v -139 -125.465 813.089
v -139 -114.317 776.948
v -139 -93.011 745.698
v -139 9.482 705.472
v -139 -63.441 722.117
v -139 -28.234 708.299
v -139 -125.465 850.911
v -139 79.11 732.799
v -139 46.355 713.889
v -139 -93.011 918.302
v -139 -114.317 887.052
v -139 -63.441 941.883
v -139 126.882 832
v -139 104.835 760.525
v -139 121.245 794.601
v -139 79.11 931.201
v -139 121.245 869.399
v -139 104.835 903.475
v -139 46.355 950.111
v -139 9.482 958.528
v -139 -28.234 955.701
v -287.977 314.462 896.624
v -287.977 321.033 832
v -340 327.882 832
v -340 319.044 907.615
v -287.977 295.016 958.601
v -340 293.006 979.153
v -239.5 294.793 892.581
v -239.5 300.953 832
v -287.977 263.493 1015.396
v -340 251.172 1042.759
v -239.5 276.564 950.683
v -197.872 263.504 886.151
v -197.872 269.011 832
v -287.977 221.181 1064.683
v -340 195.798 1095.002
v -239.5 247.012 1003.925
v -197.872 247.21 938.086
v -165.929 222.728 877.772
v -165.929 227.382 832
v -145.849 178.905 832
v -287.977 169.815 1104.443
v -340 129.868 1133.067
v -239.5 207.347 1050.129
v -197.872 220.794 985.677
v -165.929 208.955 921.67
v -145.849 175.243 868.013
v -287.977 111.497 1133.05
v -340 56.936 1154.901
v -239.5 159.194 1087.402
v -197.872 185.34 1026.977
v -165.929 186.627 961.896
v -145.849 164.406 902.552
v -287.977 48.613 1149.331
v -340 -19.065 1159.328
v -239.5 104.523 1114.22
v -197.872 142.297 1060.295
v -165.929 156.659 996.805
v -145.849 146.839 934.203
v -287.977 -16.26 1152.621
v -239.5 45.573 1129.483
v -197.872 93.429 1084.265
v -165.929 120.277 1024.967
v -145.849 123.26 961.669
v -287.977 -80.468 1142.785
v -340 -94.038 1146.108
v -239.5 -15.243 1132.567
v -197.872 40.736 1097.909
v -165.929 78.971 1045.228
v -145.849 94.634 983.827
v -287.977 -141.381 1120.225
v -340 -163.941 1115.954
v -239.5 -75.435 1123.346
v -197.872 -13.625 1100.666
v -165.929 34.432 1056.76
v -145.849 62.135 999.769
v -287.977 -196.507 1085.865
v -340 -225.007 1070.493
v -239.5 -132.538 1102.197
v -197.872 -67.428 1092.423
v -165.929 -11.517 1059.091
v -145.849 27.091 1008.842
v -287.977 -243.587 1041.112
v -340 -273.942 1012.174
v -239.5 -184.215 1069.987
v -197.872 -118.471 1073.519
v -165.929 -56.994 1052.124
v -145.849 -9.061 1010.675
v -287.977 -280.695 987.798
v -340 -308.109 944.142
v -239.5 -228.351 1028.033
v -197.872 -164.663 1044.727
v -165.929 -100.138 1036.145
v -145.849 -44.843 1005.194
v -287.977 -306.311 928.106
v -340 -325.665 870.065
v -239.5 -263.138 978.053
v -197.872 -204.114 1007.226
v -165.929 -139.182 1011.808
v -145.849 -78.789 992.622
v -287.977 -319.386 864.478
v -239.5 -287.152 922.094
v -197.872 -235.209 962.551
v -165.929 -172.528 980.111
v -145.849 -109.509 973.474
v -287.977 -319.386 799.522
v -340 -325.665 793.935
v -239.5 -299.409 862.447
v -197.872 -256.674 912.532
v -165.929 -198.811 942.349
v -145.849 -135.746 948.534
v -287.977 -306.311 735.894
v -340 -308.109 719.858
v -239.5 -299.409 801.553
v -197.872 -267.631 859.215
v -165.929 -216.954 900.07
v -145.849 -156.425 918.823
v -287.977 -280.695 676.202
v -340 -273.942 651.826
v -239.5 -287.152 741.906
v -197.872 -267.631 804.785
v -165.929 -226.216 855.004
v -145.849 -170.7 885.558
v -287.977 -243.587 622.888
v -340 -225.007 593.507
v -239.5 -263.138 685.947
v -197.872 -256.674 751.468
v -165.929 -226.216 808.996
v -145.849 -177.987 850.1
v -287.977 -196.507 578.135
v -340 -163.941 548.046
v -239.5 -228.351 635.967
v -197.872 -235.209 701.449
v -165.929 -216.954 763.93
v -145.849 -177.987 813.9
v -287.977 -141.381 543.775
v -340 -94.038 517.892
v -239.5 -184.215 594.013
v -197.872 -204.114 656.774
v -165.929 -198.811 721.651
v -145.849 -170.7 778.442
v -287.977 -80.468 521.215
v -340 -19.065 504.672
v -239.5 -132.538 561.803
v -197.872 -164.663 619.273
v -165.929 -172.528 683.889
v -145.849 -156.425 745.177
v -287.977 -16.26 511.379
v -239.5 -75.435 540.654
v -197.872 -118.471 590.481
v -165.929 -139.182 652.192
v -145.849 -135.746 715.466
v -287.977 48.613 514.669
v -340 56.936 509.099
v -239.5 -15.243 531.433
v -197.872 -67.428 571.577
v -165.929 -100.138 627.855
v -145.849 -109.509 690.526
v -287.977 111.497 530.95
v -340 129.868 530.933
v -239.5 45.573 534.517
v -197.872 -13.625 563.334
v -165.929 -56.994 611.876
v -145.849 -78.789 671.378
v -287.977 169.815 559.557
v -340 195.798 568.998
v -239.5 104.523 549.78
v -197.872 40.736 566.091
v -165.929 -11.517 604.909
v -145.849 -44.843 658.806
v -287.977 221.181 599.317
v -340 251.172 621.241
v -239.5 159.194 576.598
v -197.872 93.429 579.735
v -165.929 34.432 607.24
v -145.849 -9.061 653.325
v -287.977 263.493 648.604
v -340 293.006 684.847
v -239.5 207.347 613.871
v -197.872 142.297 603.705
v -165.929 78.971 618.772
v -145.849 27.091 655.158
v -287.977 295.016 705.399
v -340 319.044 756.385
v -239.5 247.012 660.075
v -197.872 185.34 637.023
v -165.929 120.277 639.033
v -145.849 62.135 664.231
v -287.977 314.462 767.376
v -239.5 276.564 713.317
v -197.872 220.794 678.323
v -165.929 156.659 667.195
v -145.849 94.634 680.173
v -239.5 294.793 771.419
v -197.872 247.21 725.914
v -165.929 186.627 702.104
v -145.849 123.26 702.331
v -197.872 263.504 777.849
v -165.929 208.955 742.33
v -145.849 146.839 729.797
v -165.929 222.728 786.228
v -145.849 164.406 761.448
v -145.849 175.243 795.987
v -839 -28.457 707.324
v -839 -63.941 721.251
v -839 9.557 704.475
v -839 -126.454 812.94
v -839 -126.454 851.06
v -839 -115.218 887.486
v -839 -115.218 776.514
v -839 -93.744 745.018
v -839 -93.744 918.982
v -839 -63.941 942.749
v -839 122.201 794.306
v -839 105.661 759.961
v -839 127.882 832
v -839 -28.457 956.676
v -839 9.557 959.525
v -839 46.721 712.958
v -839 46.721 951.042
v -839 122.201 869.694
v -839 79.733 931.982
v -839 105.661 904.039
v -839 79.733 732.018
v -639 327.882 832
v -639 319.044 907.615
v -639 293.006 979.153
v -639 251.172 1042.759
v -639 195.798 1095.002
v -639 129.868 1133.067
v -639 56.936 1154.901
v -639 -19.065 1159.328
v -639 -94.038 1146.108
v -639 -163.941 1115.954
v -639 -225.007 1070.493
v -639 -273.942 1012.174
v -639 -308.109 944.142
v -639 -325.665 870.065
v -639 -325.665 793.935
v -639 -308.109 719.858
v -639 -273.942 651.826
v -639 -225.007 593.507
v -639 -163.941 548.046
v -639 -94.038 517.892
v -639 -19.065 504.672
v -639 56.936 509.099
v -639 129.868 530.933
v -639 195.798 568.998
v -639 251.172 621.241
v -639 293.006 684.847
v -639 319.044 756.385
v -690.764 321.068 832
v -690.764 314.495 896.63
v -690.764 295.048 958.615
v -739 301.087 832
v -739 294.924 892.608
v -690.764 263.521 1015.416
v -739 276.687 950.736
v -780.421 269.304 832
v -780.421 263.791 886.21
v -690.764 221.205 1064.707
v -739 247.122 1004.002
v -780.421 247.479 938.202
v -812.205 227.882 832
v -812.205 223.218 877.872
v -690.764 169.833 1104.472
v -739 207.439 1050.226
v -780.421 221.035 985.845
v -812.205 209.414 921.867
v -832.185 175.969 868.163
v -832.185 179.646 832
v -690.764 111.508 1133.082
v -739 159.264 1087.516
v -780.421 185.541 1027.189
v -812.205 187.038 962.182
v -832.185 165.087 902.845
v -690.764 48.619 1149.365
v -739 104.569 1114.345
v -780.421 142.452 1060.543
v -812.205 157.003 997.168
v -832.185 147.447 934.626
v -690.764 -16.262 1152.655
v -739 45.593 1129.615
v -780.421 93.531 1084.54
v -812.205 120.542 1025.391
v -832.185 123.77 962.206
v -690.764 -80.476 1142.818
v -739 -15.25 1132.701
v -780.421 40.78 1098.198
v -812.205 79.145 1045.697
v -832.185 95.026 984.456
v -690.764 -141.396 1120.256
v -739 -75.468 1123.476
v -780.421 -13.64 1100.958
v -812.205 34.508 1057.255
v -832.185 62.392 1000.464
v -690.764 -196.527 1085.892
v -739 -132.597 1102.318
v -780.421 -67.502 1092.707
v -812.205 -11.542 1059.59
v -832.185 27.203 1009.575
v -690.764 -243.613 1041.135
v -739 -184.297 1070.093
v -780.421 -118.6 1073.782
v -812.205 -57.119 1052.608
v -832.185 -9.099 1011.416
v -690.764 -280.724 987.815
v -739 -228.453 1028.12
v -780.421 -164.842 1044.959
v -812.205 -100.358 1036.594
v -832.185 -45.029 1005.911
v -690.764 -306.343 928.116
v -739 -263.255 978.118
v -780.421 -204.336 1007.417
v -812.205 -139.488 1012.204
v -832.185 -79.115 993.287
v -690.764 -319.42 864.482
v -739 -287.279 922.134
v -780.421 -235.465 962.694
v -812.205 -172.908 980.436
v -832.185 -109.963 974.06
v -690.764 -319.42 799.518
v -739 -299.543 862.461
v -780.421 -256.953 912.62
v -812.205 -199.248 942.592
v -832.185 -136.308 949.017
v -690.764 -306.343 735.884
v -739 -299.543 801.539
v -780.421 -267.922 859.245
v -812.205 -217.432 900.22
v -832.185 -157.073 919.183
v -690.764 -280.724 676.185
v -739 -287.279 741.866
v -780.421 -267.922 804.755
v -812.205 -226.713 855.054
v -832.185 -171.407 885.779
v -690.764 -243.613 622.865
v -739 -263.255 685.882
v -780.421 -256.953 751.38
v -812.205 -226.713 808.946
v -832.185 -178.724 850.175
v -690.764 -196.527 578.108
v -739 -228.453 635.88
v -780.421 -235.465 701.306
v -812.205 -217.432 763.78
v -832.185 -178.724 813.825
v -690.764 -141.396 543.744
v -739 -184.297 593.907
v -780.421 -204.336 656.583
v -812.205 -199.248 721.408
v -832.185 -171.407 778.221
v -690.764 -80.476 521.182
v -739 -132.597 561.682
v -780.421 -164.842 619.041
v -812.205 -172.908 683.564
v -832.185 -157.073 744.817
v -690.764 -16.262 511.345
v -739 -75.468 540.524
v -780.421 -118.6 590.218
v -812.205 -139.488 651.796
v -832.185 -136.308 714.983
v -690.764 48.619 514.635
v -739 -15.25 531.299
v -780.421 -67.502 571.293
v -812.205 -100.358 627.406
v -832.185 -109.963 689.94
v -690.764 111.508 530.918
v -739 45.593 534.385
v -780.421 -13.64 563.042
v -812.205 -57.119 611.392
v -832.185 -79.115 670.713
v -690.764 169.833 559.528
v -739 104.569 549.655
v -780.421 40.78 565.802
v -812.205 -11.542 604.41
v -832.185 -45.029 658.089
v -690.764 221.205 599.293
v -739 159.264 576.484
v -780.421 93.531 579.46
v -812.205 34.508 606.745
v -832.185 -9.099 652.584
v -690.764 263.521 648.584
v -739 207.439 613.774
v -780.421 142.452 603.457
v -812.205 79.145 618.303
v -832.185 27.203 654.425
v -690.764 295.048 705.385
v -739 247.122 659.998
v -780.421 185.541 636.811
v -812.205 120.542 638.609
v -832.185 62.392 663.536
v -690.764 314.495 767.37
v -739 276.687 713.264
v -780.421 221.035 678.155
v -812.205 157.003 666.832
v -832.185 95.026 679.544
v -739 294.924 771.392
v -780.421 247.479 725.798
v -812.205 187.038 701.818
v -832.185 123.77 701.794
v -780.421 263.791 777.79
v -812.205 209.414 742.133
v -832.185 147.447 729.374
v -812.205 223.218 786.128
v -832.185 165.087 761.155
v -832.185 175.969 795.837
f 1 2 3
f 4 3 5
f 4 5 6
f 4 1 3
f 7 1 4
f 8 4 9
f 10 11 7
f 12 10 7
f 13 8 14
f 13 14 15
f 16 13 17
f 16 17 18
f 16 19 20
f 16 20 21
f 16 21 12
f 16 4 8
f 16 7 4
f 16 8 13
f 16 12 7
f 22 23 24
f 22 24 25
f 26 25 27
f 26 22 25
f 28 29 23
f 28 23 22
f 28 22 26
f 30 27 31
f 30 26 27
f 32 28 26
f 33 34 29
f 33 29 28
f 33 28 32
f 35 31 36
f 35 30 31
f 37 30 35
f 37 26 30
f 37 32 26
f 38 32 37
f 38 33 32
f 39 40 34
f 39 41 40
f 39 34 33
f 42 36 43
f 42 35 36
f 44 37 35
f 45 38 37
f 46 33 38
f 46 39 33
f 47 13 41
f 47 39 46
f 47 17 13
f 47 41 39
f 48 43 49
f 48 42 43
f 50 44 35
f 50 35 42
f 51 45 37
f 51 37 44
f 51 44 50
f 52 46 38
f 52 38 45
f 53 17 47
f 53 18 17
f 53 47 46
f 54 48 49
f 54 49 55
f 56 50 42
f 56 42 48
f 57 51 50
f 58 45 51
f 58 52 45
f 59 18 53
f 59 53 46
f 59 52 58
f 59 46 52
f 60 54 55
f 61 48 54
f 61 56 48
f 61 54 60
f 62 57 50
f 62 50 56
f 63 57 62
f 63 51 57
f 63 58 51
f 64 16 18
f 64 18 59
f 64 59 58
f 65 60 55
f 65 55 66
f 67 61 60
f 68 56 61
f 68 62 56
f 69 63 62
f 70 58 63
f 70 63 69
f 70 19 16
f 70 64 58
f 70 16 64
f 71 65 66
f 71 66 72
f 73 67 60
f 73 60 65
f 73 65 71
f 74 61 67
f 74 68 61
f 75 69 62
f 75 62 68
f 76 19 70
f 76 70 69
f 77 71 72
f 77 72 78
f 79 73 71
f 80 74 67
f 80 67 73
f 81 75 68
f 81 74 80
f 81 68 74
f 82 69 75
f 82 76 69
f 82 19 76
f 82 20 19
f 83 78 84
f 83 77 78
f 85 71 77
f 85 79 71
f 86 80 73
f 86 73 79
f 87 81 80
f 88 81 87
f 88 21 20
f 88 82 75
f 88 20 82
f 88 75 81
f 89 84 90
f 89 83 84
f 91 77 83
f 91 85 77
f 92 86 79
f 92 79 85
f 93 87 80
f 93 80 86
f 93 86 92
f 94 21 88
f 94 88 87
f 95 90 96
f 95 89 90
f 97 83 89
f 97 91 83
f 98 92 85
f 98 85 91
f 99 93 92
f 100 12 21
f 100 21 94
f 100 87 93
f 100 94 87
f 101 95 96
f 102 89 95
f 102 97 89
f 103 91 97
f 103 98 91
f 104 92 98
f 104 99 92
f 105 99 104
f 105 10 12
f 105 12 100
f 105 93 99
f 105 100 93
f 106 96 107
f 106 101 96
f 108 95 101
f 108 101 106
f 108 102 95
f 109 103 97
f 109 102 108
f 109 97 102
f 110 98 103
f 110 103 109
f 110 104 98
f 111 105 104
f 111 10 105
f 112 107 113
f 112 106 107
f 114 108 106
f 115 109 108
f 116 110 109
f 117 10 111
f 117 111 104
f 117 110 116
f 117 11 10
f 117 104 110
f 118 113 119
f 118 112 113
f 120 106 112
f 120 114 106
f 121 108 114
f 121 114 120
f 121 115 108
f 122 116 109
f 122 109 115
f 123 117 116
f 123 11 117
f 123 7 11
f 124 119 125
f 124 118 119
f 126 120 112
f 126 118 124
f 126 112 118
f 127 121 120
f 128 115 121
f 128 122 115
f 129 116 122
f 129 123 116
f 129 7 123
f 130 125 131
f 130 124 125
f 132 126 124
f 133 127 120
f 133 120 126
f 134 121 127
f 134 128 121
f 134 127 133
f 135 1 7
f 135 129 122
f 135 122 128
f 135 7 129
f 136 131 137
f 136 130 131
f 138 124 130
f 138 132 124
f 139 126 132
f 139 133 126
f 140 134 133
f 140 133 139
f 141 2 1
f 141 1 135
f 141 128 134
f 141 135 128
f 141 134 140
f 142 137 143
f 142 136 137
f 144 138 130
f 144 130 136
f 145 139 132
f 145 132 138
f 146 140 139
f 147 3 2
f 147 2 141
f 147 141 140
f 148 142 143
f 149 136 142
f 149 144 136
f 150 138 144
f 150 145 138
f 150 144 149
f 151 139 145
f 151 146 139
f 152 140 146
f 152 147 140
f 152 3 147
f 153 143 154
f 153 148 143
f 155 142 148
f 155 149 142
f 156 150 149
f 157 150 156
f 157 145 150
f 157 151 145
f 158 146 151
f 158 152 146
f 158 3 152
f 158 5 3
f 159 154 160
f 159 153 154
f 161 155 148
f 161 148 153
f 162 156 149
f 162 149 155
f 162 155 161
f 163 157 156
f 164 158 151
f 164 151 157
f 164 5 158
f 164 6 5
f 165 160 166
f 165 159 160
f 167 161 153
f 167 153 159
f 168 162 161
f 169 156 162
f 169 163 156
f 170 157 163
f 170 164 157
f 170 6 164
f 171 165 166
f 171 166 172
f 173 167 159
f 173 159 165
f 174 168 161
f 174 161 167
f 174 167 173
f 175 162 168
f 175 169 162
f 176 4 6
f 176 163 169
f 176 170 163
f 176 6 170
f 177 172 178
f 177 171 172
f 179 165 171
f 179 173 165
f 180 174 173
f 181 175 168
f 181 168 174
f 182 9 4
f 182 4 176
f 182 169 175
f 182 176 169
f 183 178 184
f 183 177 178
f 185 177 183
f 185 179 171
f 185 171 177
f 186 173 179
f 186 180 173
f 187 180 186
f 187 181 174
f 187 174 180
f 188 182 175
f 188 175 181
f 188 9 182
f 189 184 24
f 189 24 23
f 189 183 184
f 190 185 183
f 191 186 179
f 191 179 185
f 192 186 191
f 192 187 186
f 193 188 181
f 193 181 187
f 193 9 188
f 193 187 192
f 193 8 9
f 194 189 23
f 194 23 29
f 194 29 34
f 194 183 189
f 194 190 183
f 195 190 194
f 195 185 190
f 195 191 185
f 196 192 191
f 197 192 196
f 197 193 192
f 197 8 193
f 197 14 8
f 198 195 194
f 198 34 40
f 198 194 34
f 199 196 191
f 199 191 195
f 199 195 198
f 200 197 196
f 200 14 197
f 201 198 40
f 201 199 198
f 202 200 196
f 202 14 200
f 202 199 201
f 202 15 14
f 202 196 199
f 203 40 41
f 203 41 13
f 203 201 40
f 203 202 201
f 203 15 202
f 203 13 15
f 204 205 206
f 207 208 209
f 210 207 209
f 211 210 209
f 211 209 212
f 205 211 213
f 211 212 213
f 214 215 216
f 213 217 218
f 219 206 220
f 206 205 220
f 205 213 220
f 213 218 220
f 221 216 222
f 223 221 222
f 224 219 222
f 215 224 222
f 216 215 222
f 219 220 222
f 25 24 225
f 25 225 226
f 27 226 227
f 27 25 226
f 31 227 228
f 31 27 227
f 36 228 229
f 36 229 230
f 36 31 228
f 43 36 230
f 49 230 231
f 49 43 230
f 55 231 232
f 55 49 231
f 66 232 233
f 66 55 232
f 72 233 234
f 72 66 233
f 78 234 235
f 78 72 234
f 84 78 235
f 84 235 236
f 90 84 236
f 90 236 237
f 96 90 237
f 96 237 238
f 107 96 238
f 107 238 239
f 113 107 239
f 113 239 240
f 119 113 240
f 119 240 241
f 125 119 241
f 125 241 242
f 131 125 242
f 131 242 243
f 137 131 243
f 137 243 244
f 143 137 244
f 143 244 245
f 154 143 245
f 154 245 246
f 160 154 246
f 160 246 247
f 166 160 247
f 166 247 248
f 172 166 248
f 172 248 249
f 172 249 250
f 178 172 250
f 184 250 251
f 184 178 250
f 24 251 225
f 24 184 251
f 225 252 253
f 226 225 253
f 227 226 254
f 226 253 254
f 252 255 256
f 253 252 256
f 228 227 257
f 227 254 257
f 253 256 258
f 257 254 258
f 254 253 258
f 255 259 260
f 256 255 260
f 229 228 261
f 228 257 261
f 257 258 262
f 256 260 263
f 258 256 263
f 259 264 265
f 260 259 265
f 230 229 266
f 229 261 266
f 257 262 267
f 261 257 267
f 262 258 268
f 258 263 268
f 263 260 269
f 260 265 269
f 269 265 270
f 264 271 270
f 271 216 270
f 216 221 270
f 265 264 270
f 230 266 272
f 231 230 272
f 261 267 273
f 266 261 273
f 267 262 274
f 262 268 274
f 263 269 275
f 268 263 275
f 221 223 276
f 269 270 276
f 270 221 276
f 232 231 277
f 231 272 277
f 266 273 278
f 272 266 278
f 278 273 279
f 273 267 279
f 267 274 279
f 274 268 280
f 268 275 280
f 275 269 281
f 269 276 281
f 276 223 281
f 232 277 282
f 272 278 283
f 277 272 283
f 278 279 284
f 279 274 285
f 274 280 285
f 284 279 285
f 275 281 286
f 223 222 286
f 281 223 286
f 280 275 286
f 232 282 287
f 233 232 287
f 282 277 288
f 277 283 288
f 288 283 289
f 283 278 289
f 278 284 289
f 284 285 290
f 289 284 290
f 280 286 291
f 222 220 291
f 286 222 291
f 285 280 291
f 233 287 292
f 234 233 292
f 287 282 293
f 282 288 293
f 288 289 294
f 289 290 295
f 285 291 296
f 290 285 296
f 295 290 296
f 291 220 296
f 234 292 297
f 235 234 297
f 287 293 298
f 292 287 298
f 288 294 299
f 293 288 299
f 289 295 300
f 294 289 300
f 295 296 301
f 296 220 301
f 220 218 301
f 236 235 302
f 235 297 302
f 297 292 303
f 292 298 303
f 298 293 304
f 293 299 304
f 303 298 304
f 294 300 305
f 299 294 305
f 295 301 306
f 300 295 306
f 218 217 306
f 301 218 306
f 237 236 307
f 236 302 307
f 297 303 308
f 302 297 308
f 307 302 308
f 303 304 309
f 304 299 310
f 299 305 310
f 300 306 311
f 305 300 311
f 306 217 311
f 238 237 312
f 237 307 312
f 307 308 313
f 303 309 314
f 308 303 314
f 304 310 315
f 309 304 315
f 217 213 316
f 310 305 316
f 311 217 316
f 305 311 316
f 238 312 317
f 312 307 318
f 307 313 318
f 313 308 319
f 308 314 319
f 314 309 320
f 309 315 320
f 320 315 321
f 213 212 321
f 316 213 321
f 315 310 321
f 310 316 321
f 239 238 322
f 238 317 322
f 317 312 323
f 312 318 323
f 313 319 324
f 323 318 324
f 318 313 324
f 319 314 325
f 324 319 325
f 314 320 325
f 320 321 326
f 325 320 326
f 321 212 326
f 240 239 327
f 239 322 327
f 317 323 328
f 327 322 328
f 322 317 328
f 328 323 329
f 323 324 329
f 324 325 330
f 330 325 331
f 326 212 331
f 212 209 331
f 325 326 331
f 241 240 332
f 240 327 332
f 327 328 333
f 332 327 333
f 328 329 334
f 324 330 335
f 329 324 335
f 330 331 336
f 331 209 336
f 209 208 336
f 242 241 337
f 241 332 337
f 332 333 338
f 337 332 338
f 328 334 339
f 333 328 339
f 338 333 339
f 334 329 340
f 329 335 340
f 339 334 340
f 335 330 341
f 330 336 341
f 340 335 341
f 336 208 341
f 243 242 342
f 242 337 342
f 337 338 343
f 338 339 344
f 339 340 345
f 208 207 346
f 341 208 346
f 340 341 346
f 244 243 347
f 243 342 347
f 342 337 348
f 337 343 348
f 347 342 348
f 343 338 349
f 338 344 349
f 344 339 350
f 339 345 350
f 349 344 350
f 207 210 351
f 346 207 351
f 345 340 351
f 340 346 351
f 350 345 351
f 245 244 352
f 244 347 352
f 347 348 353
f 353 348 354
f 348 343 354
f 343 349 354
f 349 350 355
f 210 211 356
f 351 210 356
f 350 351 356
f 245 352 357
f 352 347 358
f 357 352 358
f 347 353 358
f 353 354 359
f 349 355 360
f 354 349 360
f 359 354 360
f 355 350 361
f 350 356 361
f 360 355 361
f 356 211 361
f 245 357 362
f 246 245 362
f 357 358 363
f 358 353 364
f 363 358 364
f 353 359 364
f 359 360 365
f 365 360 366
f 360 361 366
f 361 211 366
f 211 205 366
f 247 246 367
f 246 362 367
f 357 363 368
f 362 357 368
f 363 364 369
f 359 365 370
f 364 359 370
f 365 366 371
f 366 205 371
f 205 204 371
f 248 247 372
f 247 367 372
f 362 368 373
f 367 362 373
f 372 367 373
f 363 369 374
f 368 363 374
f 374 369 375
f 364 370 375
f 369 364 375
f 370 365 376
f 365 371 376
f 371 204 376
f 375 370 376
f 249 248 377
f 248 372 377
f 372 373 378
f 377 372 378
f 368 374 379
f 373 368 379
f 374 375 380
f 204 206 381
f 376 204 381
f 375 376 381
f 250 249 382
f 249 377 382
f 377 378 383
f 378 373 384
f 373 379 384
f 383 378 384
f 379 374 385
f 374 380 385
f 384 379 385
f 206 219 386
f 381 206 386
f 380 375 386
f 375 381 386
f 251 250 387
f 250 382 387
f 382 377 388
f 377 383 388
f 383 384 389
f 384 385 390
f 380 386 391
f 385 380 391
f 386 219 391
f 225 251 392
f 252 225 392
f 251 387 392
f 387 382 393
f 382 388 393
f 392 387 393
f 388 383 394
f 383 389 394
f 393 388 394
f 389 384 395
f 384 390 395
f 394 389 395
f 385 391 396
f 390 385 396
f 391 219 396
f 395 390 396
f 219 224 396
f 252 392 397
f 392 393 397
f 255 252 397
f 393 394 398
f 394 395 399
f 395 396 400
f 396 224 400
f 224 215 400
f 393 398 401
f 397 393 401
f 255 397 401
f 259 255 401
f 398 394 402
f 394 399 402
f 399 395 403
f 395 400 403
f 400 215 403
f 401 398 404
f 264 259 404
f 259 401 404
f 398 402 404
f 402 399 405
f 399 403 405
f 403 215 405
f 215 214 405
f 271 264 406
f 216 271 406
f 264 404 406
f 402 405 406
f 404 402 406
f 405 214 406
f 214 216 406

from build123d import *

# Parameters (mm, degrees)
SKETCH004_R  = 327.882384
PAD003_DEPTH = 350
FILLET_R     = 200
FILLET001_R  = 201


with BuildPart() as part:
    # Sketch004 → Pad003 (new body, symmetric)
    with BuildSketch(Plane.YZ):
        Circle(SKETCH004_R)
    extrude(amount=PAD003_DEPTH, both=True)

    # Fillet
    fillet_edges = [part.edges().sort_by_distance(p)[0] for p in [
        (-350, -327.882384, 0),
    ]]
    fillet(fillet_edges, radius=FILLET_R)

    # Fillet001
    fillet001_edges = [part.edges().sort_by_distance(p)[0] for p in [
        (350, -327.882384, 0),
    ]]
    fillet(fillet001_edges, radius=FILLET001_R)


with BuildPart() as part_1:
    # Body003 placement: moved
    add(part.part.moved(Location((-489, 0, 832))))


solid = part_1.part
